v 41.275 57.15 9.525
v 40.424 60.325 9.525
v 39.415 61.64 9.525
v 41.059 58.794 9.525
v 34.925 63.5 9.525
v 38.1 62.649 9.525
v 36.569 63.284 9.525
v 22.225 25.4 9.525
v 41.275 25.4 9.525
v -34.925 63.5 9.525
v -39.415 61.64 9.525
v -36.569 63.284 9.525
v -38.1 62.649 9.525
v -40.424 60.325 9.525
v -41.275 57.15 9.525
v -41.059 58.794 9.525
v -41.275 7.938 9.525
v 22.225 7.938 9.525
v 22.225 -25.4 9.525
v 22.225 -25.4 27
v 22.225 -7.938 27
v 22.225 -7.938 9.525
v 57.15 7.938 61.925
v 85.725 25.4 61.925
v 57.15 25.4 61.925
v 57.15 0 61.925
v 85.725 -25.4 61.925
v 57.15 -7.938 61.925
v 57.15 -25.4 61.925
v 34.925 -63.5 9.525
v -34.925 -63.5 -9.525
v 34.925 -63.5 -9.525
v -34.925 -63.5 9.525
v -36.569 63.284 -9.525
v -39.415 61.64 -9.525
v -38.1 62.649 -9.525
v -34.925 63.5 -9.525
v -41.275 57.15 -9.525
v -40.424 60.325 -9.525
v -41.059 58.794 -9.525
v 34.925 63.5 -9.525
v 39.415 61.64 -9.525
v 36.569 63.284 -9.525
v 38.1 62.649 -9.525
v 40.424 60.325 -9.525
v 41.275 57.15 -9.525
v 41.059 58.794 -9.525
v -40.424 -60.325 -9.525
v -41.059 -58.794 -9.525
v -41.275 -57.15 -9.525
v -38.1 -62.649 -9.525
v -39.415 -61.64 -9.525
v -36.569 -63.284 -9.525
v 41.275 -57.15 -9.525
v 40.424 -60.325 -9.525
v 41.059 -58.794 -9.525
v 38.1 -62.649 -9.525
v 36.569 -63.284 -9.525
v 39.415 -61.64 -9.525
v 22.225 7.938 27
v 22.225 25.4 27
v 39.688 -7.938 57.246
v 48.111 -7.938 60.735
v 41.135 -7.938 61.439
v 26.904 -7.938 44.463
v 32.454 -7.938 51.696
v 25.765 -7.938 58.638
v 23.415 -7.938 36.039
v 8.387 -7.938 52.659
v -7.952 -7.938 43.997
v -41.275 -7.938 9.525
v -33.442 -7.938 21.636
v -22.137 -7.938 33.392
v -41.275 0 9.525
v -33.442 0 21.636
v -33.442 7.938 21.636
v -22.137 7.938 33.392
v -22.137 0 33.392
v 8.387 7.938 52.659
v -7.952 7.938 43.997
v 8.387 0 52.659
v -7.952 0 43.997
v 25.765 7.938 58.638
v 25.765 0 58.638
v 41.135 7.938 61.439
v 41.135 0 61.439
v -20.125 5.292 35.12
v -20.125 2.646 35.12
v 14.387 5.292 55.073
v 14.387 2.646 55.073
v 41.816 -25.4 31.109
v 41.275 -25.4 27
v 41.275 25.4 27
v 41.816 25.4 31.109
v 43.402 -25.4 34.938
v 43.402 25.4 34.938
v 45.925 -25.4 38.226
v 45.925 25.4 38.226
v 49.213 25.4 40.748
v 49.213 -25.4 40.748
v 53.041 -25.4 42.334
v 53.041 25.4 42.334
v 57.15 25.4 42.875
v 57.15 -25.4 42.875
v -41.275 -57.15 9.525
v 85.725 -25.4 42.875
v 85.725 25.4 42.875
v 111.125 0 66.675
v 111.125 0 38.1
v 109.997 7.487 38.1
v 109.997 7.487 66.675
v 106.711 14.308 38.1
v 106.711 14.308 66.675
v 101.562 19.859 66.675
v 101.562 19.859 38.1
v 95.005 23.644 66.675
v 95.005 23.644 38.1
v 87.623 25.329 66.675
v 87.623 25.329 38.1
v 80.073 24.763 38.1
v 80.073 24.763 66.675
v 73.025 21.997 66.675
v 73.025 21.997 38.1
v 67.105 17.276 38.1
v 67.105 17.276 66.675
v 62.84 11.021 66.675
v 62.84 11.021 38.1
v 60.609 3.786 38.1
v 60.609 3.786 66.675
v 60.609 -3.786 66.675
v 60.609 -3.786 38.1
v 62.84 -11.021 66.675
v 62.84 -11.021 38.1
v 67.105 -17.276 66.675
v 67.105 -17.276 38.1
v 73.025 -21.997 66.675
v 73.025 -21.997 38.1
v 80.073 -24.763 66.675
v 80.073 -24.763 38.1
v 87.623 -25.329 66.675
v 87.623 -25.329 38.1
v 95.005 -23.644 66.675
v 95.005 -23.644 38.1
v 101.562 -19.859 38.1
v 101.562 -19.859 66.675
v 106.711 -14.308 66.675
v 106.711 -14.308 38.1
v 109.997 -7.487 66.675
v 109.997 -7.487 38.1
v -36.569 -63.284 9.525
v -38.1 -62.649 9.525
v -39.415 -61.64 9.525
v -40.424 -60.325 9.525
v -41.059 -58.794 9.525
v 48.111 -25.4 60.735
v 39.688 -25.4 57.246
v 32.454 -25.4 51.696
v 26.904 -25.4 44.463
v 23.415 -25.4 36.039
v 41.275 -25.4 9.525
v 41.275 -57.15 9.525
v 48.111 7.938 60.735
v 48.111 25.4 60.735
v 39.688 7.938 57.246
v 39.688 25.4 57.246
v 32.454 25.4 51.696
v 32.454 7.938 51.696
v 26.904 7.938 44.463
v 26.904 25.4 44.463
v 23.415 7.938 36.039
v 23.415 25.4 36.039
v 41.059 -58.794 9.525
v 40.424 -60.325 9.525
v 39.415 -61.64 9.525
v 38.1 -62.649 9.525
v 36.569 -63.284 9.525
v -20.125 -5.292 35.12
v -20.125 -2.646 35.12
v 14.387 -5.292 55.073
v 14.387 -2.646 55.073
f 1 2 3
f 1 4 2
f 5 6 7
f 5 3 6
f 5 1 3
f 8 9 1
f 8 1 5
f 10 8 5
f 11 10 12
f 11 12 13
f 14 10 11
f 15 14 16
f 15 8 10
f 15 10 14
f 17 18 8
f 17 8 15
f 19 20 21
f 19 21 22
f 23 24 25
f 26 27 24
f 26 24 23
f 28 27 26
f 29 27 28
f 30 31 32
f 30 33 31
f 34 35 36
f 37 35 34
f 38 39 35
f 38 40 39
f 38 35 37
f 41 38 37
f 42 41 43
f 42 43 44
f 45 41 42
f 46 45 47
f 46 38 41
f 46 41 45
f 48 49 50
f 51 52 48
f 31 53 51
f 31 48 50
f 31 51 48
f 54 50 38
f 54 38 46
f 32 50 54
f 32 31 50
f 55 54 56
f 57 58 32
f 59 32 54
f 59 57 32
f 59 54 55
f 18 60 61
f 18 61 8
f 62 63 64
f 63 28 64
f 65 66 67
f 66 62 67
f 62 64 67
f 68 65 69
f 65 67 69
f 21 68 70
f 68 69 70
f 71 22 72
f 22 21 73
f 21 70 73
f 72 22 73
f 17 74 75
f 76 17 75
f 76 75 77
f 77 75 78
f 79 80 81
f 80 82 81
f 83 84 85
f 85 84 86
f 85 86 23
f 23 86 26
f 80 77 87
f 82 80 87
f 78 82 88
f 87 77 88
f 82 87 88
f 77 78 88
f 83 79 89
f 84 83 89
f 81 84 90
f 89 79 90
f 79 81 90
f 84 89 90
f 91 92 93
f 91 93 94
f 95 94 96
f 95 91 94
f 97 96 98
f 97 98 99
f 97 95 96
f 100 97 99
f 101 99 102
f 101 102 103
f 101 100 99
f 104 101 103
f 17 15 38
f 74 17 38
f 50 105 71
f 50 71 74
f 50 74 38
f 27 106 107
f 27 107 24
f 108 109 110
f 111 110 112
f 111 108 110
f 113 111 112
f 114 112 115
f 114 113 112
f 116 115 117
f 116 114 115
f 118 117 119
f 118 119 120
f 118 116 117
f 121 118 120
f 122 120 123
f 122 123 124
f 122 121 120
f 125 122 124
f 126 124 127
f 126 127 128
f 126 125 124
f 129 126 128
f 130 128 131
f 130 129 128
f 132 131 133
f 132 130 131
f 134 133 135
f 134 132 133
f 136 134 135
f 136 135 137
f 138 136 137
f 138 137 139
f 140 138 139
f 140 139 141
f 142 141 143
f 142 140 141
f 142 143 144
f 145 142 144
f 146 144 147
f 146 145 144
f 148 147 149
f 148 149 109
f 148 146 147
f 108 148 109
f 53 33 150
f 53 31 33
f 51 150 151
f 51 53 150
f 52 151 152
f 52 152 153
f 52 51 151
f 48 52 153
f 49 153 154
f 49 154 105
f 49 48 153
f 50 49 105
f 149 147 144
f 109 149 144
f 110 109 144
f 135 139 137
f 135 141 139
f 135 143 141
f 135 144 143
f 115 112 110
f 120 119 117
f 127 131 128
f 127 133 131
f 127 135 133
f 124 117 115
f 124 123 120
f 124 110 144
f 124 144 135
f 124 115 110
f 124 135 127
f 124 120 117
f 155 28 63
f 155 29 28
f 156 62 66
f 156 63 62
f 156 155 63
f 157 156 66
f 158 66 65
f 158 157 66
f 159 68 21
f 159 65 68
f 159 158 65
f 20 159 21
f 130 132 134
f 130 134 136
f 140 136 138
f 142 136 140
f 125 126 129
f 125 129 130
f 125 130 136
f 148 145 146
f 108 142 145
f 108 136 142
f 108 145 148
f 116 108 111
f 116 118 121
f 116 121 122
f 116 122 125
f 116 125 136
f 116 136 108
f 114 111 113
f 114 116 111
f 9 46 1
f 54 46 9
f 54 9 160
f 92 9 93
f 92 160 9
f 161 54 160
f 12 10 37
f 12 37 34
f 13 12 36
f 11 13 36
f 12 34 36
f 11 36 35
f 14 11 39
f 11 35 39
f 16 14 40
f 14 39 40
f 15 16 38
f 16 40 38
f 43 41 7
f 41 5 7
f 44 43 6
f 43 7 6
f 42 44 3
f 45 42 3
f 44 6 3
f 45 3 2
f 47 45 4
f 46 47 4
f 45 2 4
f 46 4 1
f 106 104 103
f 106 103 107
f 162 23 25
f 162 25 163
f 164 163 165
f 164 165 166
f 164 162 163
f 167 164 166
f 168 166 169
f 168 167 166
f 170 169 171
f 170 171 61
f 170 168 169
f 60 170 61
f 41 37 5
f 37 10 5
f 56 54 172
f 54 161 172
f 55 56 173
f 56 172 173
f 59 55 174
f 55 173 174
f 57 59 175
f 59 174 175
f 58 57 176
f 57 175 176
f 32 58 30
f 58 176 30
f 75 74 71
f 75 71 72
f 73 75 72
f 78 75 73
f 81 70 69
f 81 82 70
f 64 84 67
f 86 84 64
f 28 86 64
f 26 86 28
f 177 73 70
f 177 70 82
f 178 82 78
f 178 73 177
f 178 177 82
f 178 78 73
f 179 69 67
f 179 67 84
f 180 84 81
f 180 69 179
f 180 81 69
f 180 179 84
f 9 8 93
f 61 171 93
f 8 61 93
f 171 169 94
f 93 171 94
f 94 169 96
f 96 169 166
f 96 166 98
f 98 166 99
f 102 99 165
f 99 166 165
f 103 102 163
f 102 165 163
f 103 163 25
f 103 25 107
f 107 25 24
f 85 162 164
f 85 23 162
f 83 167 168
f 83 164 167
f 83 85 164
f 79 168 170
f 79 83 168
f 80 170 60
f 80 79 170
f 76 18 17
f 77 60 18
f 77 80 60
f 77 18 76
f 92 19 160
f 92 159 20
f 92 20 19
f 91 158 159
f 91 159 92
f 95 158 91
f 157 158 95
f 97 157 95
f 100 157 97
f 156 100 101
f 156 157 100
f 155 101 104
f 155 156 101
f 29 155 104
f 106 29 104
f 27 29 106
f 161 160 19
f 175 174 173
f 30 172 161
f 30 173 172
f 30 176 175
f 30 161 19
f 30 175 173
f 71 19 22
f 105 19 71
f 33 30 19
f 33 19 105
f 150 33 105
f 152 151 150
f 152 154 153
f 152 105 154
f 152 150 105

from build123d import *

# Parameters (mm, degrees)
F1_DEPTH = 63.5
F0_W     = 25.4
F0_H     = 19.05
F2_DEPTH = 25.4
F3_DEPTH = 7.9375
F5_R     = 6.35


# Not quite as in the source:
# - ends of sketch curves that miss each other by under 0.0002 mm in the source are joined


with BuildPart() as f1:
    # F0 (on Front) → F1 (new body, symmetric)
    with BuildSketch(Plane.XZ):
        Polygon((-41.275, -9.525), (41.275, -9.525), (41.275, 9.525), (22.225, 9.525), (-41.275, 9.525), align=None)
    extrude(amount=F1_DEPTH, both=True)

    # F0 (on Front) → F2 (join, symmetric)
    with BuildSketch(Plane.XZ):
        with BuildLine():
            Line((22.225, 9.525), (41.275, 9.525))
            Line((41.275, 9.525), (41.275, 27.0002))
            ThreePointArc((41.275, 27.0002), (45.9246798487, 38.2255201513), (57.15, 42.8752))
            Line((57.15, 42.8752), (60.325, 42.8752))
            Line((60.325, 42.8752), (60.325, 61.9252))
            Line((60.325, 61.9252), (57.15, 61.9252))
            ThreePointArc((57.15, 61.9252), (32.4542956671, 51.6959043329), (22.225, 27.0002))
            Line((22.225, 27.0002), (22.225, 9.525))
        make_face()
        with Locations((73.025, 52.4002)):
            Rectangle(F0_W, F0_H)
    extrude(amount=F2_DEPTH, both=True)

    # F0 (on Front) → F3 (join, symmetric)
    with BuildSketch(Plane.XZ):
        with BuildLine():
            add(Edge.make_bspline(
                [(-41.275, 9.525), (-28.5102911294, 35.4532189667), (11.965462938, 64.1112402081), (57.15, 61.9252)],
                knots=[0, 0, 0, 0, 111.5045361635, 111.5045361635, 111.5045361635, 111.5045361635], degree=3))
            Line((-41.275, 9.525), (22.225, 9.525))
            Line((22.225, 9.525), (22.225, 27.0002))
            ThreePointArc((22.225, 27.0002), (32.4542956671, 51.6959043329), (57.15, 61.9252))
        make_face()
    extrude(amount=F3_DEPTH, both=True)

    # F5
    f5_edges = [f1.edges().sort_by_distance(p)[0] for p in [
        (41.275, -63.5, 0),
        (-41.275, -63.5, 0),
        (41.275, 63.5, 0),
        (-41.275, 63.5, 0),
    ]]
    fillet(f5_edges, radius=F5_R)


with BuildPart() as f4:
    # F0 (on Front) → F4 (revolve)
    with BuildSketch(Plane.XZ):
        Polygon((85.725, 66.675), (85.725, 61.9252), (85.725, 42.8752), (85.725, 38.1), (111.125, 38.1), (111.125, 66.675), align=None)
    revolve(axis=Axis((85.725, 0, 52.3875), (0, 0, 1)))


solid = Compound([f1.part, f4.part])
